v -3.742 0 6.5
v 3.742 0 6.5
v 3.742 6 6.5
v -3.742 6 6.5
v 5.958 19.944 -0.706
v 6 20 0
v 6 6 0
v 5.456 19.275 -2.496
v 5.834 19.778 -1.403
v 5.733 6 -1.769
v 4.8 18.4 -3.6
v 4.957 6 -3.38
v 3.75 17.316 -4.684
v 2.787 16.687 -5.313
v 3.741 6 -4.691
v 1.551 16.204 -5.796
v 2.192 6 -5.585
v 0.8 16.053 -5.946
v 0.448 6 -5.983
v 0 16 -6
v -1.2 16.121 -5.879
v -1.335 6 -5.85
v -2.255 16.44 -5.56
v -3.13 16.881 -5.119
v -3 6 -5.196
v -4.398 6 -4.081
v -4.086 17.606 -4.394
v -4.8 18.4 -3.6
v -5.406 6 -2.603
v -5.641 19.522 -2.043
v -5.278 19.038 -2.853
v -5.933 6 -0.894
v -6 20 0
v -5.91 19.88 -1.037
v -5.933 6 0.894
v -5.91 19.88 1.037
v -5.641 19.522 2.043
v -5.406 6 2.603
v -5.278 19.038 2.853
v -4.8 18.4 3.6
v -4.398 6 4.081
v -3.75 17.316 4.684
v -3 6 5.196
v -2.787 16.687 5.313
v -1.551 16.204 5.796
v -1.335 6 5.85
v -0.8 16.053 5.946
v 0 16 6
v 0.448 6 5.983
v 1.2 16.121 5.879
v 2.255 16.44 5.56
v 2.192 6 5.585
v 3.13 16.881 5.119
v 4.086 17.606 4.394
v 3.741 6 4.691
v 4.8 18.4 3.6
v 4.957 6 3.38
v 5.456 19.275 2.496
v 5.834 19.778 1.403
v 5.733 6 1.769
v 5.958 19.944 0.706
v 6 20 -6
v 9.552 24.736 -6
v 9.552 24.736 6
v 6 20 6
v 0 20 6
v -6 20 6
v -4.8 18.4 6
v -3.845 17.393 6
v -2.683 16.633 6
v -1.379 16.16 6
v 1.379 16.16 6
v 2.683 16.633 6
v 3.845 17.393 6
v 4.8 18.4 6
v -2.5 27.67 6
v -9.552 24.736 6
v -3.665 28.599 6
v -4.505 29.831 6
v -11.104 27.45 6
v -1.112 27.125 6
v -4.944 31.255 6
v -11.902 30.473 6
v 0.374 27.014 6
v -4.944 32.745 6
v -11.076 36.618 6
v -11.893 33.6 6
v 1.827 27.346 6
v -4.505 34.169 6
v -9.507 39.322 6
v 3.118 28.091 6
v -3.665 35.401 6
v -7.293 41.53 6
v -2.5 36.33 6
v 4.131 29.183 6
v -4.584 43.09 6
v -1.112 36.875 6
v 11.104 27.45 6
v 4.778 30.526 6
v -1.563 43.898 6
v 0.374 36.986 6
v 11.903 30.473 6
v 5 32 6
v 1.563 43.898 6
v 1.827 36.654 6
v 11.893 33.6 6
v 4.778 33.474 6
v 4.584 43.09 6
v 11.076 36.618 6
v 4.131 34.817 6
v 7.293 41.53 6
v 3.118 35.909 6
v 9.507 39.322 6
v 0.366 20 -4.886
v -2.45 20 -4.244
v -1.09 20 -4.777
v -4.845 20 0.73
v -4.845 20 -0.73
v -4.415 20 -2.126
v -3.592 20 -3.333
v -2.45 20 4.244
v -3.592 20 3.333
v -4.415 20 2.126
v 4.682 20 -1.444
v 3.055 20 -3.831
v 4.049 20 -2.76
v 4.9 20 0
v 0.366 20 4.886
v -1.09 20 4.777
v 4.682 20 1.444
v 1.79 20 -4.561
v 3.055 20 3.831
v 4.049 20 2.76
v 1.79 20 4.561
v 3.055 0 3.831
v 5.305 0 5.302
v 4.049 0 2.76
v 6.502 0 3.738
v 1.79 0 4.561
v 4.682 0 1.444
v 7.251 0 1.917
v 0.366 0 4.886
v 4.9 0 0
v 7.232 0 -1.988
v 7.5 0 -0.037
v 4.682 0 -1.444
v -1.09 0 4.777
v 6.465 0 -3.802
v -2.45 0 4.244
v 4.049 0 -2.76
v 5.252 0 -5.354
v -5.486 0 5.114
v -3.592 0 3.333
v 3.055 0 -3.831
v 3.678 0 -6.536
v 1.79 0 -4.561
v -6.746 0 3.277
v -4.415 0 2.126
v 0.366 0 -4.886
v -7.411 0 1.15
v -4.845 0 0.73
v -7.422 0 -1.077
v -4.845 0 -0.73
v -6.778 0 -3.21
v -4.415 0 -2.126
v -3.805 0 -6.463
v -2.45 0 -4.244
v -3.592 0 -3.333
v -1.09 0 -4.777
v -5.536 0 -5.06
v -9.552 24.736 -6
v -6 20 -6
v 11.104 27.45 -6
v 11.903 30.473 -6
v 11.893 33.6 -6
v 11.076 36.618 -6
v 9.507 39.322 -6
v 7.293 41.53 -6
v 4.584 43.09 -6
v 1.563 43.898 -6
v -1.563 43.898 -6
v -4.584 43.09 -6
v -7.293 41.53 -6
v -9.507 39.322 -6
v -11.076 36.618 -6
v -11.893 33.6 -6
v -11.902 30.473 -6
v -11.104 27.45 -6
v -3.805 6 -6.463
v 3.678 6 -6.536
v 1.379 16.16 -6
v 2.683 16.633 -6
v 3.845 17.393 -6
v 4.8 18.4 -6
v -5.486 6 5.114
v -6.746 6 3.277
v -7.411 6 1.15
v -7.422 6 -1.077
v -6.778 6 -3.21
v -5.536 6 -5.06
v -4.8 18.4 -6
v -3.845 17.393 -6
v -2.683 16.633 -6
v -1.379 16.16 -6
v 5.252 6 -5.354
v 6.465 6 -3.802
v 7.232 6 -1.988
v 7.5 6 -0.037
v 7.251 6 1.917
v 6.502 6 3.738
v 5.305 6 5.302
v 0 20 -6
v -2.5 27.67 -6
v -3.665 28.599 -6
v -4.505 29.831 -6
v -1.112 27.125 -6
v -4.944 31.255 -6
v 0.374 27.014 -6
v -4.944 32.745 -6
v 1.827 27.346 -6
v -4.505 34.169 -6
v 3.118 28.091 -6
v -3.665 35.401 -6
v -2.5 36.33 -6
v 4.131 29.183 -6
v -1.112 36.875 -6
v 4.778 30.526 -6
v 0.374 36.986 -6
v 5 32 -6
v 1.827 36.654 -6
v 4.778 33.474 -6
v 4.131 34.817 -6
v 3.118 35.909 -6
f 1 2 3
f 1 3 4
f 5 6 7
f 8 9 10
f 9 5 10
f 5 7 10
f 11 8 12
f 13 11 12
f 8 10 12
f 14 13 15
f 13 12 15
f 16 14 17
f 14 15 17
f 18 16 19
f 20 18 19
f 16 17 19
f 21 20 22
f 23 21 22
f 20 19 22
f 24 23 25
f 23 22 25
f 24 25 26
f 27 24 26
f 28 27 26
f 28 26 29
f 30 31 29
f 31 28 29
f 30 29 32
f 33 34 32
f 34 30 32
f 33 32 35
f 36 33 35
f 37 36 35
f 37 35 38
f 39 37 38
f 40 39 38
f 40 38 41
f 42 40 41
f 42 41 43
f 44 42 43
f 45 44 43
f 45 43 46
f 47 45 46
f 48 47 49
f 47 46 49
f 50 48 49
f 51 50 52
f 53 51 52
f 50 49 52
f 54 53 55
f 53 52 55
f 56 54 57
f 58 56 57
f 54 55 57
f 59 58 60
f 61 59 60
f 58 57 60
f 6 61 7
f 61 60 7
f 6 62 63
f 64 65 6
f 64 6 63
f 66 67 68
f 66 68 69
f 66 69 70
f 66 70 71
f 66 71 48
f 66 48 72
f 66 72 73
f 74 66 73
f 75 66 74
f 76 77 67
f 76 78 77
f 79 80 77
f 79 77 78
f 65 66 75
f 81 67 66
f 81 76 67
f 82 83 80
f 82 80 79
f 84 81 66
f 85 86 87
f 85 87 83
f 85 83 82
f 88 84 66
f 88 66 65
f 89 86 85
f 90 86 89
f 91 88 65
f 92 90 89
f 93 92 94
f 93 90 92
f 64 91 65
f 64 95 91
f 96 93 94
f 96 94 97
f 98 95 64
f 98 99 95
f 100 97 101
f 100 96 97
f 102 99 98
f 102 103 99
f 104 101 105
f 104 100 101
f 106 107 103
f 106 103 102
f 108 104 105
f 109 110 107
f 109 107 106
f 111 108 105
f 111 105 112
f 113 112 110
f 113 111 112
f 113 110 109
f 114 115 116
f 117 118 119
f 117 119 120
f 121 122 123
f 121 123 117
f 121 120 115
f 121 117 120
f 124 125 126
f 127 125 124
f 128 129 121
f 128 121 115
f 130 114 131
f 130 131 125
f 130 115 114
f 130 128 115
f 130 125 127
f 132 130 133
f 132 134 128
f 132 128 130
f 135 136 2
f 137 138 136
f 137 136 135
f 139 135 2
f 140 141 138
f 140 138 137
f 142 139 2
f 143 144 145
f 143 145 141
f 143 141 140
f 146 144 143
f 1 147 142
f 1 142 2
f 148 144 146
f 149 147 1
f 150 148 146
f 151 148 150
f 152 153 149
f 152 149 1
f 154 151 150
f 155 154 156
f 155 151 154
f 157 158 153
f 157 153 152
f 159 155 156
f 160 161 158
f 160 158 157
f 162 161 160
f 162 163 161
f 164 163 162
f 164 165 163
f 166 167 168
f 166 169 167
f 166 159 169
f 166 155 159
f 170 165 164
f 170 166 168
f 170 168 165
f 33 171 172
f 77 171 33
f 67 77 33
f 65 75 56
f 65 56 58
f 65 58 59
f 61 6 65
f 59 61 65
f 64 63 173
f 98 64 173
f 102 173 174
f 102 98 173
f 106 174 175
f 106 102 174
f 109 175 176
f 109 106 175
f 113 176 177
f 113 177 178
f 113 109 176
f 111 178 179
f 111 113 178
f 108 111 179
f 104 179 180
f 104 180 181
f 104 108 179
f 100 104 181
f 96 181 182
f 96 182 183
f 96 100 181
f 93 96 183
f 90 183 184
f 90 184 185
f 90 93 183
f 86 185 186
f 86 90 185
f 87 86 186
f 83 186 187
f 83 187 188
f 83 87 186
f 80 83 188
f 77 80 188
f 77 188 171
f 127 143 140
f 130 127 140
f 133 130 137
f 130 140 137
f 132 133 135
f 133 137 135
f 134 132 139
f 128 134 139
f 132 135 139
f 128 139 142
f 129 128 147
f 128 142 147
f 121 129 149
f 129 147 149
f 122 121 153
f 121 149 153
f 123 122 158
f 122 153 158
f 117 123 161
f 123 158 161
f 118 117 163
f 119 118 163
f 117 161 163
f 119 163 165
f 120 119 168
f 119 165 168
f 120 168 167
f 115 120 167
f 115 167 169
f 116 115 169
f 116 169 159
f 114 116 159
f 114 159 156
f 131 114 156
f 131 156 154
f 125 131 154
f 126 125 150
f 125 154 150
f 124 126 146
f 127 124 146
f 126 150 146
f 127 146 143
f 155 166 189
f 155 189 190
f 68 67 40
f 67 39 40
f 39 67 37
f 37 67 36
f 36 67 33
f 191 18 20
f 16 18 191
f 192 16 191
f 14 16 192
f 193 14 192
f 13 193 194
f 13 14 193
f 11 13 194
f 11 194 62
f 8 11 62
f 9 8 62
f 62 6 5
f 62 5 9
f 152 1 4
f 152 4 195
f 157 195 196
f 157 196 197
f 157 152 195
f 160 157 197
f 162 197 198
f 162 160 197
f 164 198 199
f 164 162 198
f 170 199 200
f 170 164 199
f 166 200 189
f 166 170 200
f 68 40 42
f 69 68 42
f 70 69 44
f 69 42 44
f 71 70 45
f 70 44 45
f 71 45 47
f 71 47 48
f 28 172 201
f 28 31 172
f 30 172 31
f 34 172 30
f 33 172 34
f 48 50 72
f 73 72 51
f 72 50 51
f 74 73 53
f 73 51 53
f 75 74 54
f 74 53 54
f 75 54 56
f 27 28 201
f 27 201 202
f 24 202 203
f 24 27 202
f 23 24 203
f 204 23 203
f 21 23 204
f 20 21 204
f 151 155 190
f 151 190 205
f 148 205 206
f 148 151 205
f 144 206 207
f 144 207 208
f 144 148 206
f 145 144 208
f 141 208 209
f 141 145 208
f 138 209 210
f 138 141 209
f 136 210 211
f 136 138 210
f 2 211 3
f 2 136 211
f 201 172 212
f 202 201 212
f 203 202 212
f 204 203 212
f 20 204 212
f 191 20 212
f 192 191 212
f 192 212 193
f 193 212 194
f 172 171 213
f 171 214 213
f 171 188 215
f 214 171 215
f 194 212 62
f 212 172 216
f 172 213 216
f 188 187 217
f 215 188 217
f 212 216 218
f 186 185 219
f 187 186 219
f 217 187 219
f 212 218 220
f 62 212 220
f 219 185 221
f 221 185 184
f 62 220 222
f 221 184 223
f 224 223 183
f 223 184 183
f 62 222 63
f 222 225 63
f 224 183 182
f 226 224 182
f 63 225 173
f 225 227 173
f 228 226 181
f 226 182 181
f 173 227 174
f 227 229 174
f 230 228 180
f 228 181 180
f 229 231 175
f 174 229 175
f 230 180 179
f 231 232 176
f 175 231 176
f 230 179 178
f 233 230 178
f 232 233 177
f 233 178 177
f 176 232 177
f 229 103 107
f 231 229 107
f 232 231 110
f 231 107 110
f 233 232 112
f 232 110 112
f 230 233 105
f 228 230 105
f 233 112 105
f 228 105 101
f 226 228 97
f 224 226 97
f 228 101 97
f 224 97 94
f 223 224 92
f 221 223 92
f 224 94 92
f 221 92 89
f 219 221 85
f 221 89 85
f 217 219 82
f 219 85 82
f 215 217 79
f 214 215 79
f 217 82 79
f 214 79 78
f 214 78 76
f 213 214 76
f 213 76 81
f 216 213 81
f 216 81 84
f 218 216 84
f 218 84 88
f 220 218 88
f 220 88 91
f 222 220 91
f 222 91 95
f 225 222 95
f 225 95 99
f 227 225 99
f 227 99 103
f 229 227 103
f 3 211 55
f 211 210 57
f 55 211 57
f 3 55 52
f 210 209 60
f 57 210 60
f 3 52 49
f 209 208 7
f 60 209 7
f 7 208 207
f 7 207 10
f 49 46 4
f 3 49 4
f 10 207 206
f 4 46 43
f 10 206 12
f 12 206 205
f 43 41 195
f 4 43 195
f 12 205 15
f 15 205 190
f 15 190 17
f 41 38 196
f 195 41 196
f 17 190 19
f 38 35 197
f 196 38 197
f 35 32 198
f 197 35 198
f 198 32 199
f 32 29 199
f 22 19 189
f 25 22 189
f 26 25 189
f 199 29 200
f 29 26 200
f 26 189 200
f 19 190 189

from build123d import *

# Parameters (mm, degrees)
BOSS_EXTRUDE1_DEPTH      = 6
SKETCH3_R                = 6
BOSS_EXTRUDE2_DEPTH      = 14
BOSS_EXTRUDE3_DEPTH      = 6
BOSS_EXTRUDE3_DEPTH_BACK = 6
SKETCH5_R                = 5
CUT_EXTRUDE1_DEPTH       = 48.298702048
SKETCH6_R                = 4.9
CUT_EXTRUDE2_DEPTH       = 20


with BuildPart() as part:
    # Sketch2 → Boss-Extrude1 (new body)
    with BuildSketch(Plane(origin=(0, 0, 0), x_dir=(1, 0, 0), z_dir=(0, 1, 0))):
        with BuildLine():
            Line((-3.80541246, 6.462881402), (3.677540288, 6.536489687))
            ThreePointArc((3.677540288, 6.536489687), (7.499909291, 0.03688665), (3.741657387, -6.5))
            Line((3.741657387, -6.5), (-3.741657387, -6.5))
            ThreePointArc((-3.741657387, -6.5), (-7.499909291, -0.03688665), (-3.80541246, 6.462881402))
        make_face()
    extrude(amount=BOSS_EXTRUDE1_DEPTH)

    # Sketch3 → Boss-Extrude2 (add)
    with BuildSketch(Plane(origin=(0, 6, 0), x_dir=(1, 0, 0), z_dir=(0, 1, 0))):
        Circle(SKETCH3_R)
    extrude(amount=BOSS_EXTRUDE2_DEPTH)

    # Sketch4 → Boss-Extrude3 (add, two sides: drawn at the far end of the back side and taken through both)
    with BuildSketch(Plane.XY.offset(-BOSS_EXTRUDE3_DEPTH_BACK)):
        with BuildLine():
            Line((6, 20), (9.551839137, 24.736029469))
            ThreePointArc((9.551839137, 24.736029469), (0.00015174, 44), (-9.551535656, 24.736029469))
            Line((-9.551535656, 24.736029469), (-6, 20))
            Line((-6, 20), (-4.800072834, 18.400029674))
            ThreePointArc((-4.800072834, 18.400029674), (0, 15.999932561), (4.800072834, 18.400029674))
            Line((4.800072834, 18.400029674), (6, 20))
        make_face()
    extrude(amount=BOSS_EXTRUDE3_DEPTH + BOSS_EXTRUDE3_DEPTH_BACK)

    # Sketch5 → Cut-Extrude1 (cut, through all)
    with BuildSketch(Plane.XY.offset(6)):
        with Locations((0.00015174, 32)):
            Circle(SKETCH5_R)
    extrude(amount=-CUT_EXTRUDE1_DEPTH, mode=Mode.SUBTRACT)

    # Sketch6 → Cut-Extrude2 (cut)
    with BuildSketch(Plane.XZ):
        Circle(SKETCH6_R)
    extrude(amount=-CUT_EXTRUDE2_DEPTH, mode=Mode.SUBTRACT)


solid = part.part
